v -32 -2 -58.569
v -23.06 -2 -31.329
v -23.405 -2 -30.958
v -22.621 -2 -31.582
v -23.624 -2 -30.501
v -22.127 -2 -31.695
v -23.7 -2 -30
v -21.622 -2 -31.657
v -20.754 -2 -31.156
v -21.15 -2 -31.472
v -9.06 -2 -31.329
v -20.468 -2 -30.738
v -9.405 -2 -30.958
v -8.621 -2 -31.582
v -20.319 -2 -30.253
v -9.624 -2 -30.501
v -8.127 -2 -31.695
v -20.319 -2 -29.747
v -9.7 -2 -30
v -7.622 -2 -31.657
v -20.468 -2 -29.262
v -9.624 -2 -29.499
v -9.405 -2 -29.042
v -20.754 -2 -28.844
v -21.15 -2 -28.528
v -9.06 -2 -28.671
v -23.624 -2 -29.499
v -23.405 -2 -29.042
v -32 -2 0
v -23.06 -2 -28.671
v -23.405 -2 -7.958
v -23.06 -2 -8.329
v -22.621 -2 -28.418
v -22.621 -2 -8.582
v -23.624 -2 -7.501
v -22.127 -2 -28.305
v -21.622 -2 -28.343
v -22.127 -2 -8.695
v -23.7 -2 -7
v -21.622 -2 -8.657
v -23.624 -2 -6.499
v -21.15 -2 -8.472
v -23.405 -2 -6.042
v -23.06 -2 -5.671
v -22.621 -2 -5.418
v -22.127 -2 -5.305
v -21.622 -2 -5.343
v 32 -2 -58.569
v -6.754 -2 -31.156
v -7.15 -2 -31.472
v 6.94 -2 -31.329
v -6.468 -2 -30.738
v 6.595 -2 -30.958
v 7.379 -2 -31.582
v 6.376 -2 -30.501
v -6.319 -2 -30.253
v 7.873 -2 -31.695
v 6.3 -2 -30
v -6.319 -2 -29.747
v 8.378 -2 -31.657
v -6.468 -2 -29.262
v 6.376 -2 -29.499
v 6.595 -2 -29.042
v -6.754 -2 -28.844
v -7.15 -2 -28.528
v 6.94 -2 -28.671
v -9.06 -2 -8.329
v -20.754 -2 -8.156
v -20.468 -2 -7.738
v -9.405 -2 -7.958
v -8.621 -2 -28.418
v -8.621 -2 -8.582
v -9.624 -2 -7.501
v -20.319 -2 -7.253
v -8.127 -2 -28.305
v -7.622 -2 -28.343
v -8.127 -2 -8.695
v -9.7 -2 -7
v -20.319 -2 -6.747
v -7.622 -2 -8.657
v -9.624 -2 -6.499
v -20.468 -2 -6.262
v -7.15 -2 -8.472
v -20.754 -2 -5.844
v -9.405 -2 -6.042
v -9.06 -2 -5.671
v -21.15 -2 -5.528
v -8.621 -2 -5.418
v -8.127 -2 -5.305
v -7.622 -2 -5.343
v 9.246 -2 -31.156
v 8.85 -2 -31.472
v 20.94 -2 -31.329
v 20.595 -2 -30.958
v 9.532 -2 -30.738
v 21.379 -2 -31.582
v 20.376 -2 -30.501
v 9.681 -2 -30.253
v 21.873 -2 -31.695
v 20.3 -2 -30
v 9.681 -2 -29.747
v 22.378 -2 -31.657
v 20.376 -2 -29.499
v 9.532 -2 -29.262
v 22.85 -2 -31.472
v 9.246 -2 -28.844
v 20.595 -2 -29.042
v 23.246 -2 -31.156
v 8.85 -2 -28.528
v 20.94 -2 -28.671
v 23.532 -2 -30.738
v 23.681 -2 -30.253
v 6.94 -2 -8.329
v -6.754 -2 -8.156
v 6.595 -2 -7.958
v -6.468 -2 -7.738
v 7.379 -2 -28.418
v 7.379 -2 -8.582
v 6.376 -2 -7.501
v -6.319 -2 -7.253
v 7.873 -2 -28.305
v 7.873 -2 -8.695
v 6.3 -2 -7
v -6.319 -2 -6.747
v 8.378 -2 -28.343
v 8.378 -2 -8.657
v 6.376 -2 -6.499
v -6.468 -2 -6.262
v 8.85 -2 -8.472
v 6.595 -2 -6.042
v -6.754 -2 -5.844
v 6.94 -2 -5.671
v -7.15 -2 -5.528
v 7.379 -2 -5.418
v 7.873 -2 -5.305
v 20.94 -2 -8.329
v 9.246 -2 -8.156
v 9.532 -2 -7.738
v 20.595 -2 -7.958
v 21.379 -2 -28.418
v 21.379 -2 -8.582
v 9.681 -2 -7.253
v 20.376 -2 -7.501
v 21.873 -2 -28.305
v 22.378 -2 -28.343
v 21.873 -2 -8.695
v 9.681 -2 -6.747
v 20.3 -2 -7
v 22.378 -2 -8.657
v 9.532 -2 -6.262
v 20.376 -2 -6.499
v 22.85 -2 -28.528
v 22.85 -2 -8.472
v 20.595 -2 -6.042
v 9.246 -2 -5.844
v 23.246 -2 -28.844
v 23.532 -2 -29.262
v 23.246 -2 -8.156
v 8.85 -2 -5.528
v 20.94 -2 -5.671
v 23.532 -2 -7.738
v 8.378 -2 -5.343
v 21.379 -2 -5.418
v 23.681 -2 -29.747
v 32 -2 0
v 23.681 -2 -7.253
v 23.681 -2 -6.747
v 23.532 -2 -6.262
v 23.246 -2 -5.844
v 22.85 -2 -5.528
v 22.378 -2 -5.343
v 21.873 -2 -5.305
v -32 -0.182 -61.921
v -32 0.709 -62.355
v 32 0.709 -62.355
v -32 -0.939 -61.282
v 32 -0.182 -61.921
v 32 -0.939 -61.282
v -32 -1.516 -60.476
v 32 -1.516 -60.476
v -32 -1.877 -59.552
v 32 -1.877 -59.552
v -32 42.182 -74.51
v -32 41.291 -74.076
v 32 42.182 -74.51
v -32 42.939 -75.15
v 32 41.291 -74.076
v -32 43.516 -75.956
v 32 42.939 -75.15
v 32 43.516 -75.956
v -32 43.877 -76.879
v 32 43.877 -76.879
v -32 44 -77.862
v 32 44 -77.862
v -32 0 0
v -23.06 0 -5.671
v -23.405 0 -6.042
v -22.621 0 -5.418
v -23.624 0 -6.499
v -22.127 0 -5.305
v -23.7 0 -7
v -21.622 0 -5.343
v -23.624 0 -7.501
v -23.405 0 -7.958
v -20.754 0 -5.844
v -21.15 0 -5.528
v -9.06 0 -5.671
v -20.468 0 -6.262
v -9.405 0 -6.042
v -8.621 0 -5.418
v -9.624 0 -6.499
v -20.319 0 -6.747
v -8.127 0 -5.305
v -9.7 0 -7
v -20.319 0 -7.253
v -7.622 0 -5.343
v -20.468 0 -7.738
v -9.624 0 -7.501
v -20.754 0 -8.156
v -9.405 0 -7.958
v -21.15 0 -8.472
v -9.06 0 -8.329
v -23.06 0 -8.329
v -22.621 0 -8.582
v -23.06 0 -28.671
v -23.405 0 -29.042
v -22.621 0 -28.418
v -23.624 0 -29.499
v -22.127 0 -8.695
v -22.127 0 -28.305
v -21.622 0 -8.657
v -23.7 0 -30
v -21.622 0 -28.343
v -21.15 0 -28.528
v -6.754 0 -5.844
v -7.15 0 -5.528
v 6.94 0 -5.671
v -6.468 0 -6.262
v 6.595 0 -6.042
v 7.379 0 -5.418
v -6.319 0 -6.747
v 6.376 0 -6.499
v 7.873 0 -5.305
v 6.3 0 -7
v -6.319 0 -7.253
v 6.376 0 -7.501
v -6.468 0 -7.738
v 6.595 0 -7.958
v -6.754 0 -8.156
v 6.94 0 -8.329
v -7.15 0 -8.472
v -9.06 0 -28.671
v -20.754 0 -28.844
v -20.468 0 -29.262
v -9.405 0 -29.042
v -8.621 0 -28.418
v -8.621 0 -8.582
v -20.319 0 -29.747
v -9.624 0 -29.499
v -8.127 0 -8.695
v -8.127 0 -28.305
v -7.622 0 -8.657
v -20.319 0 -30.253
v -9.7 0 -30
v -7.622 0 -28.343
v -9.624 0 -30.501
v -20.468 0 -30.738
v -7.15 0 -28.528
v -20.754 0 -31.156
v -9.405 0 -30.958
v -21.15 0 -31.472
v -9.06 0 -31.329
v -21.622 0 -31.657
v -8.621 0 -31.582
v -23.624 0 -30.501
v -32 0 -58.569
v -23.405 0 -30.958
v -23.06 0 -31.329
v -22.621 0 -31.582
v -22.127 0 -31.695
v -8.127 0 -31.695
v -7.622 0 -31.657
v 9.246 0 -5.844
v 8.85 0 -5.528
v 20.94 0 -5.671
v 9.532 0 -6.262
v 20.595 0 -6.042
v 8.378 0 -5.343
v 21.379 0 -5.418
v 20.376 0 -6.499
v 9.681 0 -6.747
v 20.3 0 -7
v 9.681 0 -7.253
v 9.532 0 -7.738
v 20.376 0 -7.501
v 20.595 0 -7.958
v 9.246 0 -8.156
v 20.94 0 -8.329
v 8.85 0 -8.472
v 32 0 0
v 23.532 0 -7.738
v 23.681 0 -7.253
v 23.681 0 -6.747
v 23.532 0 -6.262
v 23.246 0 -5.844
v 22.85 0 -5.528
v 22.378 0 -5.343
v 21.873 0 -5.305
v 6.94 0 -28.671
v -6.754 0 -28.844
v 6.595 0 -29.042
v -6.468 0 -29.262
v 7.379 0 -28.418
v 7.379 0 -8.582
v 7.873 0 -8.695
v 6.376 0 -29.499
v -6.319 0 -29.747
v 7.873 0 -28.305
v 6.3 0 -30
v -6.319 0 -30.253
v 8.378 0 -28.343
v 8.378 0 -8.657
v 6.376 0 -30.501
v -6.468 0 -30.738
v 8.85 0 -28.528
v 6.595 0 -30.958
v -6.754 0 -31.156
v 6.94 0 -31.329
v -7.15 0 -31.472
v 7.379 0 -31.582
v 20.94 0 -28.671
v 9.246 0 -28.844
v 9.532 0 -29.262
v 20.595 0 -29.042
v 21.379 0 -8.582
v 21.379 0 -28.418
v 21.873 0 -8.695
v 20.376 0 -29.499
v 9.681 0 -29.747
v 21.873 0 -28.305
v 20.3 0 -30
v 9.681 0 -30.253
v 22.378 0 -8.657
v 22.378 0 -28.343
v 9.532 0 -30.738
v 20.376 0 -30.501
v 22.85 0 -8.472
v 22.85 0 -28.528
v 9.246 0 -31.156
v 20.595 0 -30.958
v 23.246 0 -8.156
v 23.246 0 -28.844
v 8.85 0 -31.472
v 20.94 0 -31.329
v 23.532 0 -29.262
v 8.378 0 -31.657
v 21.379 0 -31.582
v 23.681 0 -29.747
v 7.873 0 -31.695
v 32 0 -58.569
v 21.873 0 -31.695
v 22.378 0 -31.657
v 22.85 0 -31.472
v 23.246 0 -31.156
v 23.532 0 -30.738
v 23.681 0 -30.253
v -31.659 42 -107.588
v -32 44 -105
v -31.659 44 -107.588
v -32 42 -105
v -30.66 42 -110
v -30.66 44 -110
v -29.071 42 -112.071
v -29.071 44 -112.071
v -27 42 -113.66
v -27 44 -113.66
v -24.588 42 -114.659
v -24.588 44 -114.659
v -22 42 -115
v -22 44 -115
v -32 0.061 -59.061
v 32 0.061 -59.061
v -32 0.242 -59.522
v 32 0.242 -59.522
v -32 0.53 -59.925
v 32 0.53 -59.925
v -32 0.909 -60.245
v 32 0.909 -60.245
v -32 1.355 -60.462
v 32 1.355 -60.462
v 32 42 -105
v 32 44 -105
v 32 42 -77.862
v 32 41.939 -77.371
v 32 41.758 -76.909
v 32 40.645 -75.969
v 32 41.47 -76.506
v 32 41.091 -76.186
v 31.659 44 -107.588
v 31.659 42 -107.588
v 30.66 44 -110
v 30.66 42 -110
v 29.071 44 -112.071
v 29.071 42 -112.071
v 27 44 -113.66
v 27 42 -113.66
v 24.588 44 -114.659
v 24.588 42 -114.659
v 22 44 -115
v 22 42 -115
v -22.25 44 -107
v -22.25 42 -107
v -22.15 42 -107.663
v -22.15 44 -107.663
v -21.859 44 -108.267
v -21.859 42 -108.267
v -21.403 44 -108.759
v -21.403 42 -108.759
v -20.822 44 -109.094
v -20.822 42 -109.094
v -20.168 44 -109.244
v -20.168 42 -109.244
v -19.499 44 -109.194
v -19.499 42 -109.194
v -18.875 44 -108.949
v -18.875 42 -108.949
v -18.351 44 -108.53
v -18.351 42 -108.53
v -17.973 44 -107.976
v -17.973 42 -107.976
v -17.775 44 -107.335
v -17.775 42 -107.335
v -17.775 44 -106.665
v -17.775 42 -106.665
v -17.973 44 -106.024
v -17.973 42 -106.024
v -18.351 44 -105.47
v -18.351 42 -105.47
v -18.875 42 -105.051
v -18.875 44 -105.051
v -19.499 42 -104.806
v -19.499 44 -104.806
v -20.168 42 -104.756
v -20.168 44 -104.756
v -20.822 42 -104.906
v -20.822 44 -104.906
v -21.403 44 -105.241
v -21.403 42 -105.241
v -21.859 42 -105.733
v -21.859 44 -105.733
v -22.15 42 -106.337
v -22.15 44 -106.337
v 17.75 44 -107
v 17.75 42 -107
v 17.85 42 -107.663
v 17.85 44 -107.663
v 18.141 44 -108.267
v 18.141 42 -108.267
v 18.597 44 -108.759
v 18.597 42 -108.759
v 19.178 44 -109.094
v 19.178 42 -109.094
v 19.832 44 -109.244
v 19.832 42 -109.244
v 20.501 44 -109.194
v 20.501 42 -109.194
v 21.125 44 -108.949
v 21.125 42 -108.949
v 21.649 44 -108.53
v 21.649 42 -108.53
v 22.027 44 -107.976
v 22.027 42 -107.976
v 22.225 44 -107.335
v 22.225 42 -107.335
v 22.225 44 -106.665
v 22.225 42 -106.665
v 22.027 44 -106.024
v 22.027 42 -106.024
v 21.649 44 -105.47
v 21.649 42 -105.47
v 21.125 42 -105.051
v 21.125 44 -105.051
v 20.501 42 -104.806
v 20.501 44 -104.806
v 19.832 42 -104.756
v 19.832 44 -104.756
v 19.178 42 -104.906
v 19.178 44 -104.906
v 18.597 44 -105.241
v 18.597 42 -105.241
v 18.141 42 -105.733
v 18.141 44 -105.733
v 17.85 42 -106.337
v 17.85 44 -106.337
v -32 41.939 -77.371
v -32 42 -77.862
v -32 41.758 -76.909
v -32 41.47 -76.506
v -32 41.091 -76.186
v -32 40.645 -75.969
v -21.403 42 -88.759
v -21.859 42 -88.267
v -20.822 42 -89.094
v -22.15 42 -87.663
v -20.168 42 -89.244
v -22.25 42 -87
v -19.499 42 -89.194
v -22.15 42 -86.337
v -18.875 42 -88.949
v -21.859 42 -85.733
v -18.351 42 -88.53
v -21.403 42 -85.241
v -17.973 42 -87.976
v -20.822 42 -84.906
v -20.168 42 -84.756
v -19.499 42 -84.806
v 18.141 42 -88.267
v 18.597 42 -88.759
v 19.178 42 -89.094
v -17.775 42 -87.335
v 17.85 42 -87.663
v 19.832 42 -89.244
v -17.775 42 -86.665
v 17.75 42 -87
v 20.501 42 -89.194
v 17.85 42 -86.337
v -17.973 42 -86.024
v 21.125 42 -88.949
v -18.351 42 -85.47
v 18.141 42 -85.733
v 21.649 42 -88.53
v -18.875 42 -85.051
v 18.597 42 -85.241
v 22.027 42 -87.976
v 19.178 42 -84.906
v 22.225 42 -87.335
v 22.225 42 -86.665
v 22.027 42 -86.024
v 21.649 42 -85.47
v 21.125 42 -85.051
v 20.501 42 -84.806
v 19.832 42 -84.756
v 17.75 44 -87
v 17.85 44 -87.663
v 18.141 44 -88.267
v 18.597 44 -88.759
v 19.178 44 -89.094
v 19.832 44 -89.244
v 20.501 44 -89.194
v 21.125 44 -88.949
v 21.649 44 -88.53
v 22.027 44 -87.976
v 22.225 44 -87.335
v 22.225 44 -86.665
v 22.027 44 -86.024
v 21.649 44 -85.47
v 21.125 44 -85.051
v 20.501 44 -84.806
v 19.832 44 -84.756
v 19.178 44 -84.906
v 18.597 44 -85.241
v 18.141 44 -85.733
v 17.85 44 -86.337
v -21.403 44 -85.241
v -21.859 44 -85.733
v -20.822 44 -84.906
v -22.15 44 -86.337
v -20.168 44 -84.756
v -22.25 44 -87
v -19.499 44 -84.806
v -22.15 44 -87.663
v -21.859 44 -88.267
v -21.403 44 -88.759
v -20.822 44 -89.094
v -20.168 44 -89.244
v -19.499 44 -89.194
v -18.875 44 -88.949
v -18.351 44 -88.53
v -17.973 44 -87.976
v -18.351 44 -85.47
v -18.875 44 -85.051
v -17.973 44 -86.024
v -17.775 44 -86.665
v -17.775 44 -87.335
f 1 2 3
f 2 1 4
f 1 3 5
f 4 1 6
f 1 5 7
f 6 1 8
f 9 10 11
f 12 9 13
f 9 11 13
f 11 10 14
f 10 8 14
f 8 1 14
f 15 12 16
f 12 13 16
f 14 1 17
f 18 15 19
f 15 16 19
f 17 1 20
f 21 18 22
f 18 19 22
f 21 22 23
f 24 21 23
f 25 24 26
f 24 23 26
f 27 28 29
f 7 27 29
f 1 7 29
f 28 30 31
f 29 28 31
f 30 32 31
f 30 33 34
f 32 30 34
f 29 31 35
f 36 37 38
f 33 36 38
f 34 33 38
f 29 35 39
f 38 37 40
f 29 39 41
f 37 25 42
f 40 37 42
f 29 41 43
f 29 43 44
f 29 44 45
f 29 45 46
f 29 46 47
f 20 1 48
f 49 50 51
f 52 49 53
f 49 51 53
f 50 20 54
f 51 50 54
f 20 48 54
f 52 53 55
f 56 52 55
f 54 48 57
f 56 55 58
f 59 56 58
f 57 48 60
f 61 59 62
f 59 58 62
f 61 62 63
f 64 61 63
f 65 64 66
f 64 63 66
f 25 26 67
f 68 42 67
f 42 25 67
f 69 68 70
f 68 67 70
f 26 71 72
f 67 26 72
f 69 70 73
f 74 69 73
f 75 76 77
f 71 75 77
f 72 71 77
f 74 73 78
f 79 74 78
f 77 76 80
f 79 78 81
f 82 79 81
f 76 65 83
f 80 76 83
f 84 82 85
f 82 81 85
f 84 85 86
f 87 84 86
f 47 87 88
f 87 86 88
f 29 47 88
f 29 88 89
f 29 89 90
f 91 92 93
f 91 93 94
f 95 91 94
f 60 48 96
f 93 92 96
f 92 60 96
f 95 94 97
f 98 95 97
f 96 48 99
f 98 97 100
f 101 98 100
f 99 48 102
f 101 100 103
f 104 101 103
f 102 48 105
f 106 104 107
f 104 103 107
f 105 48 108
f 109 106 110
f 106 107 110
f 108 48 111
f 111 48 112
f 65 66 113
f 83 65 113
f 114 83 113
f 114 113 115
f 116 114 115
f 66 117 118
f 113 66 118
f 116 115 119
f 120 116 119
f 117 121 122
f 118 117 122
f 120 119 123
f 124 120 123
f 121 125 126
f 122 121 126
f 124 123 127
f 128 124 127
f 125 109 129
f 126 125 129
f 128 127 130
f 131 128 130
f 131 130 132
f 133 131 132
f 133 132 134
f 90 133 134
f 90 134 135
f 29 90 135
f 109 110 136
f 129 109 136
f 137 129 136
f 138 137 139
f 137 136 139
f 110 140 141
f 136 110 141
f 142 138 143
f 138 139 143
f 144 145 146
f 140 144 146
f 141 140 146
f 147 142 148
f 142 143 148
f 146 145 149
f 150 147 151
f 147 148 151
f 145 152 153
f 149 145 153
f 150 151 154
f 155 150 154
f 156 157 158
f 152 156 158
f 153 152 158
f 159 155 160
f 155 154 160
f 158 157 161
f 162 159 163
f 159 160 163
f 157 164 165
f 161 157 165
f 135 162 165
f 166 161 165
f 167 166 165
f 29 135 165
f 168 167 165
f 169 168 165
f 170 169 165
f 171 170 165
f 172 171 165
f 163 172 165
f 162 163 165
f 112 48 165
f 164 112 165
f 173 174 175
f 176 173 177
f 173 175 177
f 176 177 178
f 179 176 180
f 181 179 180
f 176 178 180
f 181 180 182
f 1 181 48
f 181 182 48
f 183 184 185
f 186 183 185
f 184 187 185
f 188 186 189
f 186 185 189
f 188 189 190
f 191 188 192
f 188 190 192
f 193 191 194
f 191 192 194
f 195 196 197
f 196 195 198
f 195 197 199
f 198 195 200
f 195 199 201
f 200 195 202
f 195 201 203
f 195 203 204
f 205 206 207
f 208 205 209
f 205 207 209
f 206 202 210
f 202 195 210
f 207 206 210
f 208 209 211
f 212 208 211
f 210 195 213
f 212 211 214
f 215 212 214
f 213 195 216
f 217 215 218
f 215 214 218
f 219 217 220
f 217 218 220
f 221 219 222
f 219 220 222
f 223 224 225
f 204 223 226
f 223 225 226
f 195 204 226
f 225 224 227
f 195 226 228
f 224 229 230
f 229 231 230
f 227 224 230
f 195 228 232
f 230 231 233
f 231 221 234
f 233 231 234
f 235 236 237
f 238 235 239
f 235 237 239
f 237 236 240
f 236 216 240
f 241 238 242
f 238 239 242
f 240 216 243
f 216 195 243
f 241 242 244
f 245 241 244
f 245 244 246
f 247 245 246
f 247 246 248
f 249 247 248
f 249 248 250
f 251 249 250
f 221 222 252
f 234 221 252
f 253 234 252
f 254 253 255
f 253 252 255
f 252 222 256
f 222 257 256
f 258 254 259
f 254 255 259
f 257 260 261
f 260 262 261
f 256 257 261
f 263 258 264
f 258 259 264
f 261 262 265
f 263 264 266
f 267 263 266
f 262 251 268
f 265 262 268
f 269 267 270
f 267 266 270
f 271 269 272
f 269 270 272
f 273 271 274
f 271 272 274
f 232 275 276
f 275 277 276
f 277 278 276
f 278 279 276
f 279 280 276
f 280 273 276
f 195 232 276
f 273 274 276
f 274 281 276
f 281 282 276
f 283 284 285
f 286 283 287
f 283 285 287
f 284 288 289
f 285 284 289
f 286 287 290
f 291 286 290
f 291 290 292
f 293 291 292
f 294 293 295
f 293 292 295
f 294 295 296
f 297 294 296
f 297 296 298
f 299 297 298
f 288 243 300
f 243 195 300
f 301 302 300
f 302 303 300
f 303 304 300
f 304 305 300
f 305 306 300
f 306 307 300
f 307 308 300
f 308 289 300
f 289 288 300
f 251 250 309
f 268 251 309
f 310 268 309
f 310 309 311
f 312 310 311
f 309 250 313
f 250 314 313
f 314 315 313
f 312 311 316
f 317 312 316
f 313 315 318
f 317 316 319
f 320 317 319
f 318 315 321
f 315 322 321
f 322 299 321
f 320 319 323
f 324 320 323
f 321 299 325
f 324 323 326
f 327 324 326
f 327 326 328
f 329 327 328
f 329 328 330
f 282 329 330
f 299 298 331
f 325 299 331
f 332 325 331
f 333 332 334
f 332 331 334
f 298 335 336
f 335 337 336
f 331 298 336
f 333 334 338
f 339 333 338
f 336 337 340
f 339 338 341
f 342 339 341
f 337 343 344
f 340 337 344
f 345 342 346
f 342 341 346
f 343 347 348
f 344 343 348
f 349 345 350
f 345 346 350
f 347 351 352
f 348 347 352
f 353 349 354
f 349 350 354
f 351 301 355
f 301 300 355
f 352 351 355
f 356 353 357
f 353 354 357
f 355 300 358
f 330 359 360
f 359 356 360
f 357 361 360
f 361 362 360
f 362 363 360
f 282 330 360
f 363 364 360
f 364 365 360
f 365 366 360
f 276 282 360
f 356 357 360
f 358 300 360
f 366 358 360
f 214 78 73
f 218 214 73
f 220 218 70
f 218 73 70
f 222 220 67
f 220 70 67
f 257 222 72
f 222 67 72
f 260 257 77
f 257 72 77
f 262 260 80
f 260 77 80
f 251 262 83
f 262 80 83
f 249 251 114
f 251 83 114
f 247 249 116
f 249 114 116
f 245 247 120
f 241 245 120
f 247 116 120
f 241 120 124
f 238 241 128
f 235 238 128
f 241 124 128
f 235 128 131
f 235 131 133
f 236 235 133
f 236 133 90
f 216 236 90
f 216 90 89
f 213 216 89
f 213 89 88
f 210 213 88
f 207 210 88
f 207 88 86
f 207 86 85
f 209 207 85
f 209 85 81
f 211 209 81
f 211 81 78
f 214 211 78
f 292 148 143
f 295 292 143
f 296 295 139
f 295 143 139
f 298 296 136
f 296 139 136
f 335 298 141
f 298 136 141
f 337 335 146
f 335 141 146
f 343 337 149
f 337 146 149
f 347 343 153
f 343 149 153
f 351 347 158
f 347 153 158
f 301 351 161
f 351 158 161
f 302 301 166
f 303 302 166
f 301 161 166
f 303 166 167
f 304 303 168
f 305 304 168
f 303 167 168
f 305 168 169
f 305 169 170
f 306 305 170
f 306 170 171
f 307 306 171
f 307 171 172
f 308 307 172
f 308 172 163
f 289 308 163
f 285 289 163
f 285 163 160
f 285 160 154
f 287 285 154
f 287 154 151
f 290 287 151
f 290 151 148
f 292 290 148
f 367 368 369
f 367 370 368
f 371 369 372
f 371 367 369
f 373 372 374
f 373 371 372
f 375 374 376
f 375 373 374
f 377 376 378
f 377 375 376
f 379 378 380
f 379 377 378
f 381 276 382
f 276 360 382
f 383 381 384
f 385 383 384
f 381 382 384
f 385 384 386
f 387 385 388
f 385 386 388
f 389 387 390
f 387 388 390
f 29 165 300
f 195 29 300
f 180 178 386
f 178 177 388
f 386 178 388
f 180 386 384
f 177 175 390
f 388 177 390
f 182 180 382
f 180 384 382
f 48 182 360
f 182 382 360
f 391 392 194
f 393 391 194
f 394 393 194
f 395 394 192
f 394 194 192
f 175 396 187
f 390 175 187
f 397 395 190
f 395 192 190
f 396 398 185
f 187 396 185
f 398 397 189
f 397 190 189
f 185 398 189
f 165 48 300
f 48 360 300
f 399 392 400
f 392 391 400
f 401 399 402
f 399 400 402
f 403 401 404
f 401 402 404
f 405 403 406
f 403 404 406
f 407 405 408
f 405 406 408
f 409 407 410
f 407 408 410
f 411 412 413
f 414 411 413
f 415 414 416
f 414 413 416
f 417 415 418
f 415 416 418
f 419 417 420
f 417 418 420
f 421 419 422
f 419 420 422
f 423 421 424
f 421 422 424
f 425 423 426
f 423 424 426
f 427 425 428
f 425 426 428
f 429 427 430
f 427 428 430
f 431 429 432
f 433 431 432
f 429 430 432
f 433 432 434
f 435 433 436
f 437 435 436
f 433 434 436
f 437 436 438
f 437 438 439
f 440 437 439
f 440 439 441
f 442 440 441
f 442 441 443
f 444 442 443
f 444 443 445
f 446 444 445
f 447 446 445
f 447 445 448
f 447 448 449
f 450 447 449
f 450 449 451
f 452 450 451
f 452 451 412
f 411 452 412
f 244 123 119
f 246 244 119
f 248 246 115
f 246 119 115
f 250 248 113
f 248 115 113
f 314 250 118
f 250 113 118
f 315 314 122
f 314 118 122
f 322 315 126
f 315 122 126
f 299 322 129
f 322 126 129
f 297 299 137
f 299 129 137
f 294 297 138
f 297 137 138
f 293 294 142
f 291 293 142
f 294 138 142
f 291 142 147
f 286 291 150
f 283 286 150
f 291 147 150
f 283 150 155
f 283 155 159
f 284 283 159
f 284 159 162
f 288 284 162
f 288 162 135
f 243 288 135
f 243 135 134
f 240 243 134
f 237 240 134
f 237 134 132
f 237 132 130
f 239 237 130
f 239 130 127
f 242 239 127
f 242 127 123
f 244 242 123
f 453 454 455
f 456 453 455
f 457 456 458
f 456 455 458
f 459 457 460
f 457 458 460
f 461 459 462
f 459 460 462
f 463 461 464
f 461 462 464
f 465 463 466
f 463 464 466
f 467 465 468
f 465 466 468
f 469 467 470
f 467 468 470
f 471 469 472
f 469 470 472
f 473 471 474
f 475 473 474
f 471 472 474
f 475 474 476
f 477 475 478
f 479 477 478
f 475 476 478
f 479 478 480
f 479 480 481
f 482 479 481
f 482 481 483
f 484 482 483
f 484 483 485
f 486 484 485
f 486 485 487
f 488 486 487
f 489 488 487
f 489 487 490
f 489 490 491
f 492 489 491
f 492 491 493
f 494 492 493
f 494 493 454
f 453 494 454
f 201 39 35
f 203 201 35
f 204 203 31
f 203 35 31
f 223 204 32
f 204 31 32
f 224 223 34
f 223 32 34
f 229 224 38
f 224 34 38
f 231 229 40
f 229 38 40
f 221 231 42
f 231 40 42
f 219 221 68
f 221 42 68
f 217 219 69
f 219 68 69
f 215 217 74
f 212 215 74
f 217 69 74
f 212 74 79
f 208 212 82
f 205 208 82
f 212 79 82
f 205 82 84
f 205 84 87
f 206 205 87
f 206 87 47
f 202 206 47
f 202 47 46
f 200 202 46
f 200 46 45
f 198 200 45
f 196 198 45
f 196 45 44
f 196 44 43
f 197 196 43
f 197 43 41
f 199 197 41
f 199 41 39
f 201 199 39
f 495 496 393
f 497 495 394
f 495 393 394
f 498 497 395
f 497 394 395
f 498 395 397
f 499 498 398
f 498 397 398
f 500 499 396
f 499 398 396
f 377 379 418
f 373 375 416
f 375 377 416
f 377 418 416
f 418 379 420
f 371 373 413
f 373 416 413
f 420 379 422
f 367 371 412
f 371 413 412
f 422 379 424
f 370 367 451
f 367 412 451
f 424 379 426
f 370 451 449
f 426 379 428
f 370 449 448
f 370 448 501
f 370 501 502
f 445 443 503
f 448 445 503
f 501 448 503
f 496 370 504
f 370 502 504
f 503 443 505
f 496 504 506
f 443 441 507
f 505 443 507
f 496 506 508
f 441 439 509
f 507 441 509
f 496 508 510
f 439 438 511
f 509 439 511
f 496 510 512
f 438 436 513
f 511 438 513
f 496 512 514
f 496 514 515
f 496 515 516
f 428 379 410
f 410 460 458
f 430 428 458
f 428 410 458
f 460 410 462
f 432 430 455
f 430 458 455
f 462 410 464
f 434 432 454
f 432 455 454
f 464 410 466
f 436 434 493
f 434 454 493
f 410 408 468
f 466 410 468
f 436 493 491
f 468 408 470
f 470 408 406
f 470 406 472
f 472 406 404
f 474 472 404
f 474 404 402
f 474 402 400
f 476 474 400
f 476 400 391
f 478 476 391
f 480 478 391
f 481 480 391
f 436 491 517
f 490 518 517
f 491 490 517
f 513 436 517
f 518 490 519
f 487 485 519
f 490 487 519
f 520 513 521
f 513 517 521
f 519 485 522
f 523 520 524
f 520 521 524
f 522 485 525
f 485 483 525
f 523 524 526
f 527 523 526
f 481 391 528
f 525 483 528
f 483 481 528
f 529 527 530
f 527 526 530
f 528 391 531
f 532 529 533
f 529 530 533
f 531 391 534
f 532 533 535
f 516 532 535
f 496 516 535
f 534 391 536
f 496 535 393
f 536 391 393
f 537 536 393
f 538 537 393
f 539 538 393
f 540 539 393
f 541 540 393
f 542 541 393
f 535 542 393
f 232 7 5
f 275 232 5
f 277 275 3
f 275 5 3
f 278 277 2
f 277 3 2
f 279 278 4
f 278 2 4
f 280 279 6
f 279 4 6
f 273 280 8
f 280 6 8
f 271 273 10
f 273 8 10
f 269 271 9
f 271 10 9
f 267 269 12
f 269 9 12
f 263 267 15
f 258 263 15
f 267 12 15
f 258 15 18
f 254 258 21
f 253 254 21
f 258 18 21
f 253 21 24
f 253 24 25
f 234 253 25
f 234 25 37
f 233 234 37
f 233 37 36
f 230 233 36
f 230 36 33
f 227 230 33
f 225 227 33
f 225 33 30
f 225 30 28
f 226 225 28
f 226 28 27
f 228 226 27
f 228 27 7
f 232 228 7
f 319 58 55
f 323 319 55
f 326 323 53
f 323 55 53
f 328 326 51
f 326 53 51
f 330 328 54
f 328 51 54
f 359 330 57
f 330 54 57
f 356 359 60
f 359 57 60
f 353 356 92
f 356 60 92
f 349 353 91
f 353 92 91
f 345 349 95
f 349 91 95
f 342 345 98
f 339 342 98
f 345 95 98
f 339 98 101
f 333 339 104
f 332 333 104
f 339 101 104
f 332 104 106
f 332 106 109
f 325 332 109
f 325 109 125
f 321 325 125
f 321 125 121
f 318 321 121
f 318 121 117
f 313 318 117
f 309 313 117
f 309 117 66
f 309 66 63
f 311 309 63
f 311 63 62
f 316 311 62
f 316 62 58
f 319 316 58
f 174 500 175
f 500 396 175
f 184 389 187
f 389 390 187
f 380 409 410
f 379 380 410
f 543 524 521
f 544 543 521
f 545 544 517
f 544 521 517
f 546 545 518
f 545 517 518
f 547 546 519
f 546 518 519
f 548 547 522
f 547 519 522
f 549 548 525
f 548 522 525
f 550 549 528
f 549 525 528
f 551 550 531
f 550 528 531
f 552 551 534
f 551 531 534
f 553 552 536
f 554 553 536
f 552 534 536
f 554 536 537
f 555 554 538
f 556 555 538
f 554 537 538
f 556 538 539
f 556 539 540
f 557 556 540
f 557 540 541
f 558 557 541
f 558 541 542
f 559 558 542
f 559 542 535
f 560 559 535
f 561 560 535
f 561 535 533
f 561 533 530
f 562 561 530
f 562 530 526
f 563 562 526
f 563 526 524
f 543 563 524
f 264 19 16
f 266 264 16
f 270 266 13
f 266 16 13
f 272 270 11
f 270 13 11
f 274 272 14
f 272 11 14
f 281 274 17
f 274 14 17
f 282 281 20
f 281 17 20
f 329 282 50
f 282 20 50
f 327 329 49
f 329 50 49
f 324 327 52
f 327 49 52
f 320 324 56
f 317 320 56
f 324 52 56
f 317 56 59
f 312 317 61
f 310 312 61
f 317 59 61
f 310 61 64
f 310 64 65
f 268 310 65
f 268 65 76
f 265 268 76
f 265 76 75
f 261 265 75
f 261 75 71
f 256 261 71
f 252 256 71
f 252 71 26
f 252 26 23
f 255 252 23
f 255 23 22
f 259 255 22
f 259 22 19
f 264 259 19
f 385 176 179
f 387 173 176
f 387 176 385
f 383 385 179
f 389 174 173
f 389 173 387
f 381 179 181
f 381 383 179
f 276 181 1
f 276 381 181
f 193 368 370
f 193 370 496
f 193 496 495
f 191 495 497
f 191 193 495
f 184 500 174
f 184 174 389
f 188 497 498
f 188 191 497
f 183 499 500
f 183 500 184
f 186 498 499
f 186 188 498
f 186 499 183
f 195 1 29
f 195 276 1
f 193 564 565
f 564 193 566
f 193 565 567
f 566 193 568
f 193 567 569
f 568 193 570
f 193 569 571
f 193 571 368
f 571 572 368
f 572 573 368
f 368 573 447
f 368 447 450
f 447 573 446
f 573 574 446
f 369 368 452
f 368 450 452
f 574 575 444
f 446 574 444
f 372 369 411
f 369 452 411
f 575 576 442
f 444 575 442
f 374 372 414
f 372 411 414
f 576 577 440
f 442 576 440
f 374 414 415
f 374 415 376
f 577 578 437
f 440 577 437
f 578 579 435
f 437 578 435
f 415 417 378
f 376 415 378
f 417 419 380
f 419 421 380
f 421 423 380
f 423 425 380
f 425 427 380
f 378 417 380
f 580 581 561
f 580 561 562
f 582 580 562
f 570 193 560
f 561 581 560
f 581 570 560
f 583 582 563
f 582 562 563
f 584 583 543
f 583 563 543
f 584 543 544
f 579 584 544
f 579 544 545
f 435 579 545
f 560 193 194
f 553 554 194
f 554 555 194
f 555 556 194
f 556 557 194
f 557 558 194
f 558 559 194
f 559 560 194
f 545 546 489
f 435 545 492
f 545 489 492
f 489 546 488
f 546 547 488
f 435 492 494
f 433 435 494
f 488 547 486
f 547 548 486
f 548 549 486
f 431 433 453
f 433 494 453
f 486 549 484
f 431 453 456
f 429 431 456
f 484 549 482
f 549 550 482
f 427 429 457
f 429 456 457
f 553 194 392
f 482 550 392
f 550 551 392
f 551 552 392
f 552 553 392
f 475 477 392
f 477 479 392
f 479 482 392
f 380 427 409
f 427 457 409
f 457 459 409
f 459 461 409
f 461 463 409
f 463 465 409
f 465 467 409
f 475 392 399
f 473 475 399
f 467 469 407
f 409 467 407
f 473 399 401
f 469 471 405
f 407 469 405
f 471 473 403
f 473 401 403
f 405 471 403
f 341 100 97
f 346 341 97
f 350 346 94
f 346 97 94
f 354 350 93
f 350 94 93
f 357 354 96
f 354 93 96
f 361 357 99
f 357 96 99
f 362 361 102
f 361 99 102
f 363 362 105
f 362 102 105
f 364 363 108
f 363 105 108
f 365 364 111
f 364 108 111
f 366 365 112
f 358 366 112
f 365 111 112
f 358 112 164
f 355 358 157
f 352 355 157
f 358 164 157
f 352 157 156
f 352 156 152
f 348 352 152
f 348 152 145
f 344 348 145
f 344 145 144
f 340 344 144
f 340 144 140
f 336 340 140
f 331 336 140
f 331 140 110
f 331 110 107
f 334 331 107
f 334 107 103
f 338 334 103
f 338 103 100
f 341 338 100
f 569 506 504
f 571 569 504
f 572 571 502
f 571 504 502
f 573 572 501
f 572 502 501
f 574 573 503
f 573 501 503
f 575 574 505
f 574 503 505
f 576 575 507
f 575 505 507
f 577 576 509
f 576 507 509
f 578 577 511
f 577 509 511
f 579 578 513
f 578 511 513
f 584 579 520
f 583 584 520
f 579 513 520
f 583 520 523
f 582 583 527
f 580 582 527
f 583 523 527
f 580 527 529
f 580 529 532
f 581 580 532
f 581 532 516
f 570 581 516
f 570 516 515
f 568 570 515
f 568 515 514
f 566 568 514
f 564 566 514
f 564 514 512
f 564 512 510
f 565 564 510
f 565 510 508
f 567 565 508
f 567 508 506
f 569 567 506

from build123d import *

# Parameters (mm, degrees)
BASE_FLANGE1_DEPTH   = 32
M3_CLEARANCE_HOLE1_D = 3.4
M4_CLEARANCE_HOLE1_D = 4.5
FILLET1_R            = 10


# Sheet-metal steps are written as plain solids
with BuildPart() as part:
    # Sketch1 → Base-Flange1 (new, symmetric)
    with BuildSketch(Plane(origin=(0, 0, 0), x_dir=(0, 0, -1), z_dir=(1, 0, 0))):
        with BuildLine():
            Line((0, 0), (58.568792855, 0))
            ThreePointArc((58.568792855, 0), (59.732688101, 0.373547463), (60.461813231, 1.354652144))
            Line((60.461813231, 1.354652144), (74.076373538, 41.290695711))
            ThreePointArc((74.076373538, 41.290695711), (75.534623798, 43.252905074), (77.862414291, 44))
            Line((77.862414291, 44), (115, 44))
            Line((115, 44), (115, 42))
            Line((115, 42), (77.862414291, 42))
            ThreePointArc((77.862414291, 42), (76.698519044, 41.626452537), (75.969393914, 40.645347856))
            Line((75.969393914, 40.645347856), (62.354833607, 0.709304289))
            ThreePointArc((62.354833607, 0.709304289), (60.896583347, -1.252905074), (58.568792855, -2))
            Line((58.568792855, -2), (0, -2))
            Line((0, -2), (0, 0))
        make_face()
    extrude(amount=BASE_FLANGE1_DEPTH, both=True)

    # M3 Clearance Hole1 (through all)
    with Locations(Plane(origin=(0, 0, 0), x_dir=(1, 0, 0), z_dir=(0, 1, 0))):
        with Locations((-22, 30), (-22, 7), (-8, 7), (-8, 30), (8, 30), (8, 7), (22, 7), (22, 30)):
            Hole(M3_CLEARANCE_HOLE1_D / 2)

    # M4 Clearance Hole1 (through all)
    with Locations(Plane(origin=(0, 44, 0), x_dir=(1, 0, 0), z_dir=(0, 1, 0))):
        with Locations((-20, 107), (-20, 87), (20, 87), (20, 107)):
            Hole(M4_CLEARANCE_HOLE1_D / 2)

    # Fillet1
    fillet1_edges = [part.edges().sort_by_distance(p)[0] for p in [
        (-32, 43, -115),
        (32, 43, -115),
    ]]
    fillet(fillet1_edges, radius=FILLET1_R)


solid = part.part
